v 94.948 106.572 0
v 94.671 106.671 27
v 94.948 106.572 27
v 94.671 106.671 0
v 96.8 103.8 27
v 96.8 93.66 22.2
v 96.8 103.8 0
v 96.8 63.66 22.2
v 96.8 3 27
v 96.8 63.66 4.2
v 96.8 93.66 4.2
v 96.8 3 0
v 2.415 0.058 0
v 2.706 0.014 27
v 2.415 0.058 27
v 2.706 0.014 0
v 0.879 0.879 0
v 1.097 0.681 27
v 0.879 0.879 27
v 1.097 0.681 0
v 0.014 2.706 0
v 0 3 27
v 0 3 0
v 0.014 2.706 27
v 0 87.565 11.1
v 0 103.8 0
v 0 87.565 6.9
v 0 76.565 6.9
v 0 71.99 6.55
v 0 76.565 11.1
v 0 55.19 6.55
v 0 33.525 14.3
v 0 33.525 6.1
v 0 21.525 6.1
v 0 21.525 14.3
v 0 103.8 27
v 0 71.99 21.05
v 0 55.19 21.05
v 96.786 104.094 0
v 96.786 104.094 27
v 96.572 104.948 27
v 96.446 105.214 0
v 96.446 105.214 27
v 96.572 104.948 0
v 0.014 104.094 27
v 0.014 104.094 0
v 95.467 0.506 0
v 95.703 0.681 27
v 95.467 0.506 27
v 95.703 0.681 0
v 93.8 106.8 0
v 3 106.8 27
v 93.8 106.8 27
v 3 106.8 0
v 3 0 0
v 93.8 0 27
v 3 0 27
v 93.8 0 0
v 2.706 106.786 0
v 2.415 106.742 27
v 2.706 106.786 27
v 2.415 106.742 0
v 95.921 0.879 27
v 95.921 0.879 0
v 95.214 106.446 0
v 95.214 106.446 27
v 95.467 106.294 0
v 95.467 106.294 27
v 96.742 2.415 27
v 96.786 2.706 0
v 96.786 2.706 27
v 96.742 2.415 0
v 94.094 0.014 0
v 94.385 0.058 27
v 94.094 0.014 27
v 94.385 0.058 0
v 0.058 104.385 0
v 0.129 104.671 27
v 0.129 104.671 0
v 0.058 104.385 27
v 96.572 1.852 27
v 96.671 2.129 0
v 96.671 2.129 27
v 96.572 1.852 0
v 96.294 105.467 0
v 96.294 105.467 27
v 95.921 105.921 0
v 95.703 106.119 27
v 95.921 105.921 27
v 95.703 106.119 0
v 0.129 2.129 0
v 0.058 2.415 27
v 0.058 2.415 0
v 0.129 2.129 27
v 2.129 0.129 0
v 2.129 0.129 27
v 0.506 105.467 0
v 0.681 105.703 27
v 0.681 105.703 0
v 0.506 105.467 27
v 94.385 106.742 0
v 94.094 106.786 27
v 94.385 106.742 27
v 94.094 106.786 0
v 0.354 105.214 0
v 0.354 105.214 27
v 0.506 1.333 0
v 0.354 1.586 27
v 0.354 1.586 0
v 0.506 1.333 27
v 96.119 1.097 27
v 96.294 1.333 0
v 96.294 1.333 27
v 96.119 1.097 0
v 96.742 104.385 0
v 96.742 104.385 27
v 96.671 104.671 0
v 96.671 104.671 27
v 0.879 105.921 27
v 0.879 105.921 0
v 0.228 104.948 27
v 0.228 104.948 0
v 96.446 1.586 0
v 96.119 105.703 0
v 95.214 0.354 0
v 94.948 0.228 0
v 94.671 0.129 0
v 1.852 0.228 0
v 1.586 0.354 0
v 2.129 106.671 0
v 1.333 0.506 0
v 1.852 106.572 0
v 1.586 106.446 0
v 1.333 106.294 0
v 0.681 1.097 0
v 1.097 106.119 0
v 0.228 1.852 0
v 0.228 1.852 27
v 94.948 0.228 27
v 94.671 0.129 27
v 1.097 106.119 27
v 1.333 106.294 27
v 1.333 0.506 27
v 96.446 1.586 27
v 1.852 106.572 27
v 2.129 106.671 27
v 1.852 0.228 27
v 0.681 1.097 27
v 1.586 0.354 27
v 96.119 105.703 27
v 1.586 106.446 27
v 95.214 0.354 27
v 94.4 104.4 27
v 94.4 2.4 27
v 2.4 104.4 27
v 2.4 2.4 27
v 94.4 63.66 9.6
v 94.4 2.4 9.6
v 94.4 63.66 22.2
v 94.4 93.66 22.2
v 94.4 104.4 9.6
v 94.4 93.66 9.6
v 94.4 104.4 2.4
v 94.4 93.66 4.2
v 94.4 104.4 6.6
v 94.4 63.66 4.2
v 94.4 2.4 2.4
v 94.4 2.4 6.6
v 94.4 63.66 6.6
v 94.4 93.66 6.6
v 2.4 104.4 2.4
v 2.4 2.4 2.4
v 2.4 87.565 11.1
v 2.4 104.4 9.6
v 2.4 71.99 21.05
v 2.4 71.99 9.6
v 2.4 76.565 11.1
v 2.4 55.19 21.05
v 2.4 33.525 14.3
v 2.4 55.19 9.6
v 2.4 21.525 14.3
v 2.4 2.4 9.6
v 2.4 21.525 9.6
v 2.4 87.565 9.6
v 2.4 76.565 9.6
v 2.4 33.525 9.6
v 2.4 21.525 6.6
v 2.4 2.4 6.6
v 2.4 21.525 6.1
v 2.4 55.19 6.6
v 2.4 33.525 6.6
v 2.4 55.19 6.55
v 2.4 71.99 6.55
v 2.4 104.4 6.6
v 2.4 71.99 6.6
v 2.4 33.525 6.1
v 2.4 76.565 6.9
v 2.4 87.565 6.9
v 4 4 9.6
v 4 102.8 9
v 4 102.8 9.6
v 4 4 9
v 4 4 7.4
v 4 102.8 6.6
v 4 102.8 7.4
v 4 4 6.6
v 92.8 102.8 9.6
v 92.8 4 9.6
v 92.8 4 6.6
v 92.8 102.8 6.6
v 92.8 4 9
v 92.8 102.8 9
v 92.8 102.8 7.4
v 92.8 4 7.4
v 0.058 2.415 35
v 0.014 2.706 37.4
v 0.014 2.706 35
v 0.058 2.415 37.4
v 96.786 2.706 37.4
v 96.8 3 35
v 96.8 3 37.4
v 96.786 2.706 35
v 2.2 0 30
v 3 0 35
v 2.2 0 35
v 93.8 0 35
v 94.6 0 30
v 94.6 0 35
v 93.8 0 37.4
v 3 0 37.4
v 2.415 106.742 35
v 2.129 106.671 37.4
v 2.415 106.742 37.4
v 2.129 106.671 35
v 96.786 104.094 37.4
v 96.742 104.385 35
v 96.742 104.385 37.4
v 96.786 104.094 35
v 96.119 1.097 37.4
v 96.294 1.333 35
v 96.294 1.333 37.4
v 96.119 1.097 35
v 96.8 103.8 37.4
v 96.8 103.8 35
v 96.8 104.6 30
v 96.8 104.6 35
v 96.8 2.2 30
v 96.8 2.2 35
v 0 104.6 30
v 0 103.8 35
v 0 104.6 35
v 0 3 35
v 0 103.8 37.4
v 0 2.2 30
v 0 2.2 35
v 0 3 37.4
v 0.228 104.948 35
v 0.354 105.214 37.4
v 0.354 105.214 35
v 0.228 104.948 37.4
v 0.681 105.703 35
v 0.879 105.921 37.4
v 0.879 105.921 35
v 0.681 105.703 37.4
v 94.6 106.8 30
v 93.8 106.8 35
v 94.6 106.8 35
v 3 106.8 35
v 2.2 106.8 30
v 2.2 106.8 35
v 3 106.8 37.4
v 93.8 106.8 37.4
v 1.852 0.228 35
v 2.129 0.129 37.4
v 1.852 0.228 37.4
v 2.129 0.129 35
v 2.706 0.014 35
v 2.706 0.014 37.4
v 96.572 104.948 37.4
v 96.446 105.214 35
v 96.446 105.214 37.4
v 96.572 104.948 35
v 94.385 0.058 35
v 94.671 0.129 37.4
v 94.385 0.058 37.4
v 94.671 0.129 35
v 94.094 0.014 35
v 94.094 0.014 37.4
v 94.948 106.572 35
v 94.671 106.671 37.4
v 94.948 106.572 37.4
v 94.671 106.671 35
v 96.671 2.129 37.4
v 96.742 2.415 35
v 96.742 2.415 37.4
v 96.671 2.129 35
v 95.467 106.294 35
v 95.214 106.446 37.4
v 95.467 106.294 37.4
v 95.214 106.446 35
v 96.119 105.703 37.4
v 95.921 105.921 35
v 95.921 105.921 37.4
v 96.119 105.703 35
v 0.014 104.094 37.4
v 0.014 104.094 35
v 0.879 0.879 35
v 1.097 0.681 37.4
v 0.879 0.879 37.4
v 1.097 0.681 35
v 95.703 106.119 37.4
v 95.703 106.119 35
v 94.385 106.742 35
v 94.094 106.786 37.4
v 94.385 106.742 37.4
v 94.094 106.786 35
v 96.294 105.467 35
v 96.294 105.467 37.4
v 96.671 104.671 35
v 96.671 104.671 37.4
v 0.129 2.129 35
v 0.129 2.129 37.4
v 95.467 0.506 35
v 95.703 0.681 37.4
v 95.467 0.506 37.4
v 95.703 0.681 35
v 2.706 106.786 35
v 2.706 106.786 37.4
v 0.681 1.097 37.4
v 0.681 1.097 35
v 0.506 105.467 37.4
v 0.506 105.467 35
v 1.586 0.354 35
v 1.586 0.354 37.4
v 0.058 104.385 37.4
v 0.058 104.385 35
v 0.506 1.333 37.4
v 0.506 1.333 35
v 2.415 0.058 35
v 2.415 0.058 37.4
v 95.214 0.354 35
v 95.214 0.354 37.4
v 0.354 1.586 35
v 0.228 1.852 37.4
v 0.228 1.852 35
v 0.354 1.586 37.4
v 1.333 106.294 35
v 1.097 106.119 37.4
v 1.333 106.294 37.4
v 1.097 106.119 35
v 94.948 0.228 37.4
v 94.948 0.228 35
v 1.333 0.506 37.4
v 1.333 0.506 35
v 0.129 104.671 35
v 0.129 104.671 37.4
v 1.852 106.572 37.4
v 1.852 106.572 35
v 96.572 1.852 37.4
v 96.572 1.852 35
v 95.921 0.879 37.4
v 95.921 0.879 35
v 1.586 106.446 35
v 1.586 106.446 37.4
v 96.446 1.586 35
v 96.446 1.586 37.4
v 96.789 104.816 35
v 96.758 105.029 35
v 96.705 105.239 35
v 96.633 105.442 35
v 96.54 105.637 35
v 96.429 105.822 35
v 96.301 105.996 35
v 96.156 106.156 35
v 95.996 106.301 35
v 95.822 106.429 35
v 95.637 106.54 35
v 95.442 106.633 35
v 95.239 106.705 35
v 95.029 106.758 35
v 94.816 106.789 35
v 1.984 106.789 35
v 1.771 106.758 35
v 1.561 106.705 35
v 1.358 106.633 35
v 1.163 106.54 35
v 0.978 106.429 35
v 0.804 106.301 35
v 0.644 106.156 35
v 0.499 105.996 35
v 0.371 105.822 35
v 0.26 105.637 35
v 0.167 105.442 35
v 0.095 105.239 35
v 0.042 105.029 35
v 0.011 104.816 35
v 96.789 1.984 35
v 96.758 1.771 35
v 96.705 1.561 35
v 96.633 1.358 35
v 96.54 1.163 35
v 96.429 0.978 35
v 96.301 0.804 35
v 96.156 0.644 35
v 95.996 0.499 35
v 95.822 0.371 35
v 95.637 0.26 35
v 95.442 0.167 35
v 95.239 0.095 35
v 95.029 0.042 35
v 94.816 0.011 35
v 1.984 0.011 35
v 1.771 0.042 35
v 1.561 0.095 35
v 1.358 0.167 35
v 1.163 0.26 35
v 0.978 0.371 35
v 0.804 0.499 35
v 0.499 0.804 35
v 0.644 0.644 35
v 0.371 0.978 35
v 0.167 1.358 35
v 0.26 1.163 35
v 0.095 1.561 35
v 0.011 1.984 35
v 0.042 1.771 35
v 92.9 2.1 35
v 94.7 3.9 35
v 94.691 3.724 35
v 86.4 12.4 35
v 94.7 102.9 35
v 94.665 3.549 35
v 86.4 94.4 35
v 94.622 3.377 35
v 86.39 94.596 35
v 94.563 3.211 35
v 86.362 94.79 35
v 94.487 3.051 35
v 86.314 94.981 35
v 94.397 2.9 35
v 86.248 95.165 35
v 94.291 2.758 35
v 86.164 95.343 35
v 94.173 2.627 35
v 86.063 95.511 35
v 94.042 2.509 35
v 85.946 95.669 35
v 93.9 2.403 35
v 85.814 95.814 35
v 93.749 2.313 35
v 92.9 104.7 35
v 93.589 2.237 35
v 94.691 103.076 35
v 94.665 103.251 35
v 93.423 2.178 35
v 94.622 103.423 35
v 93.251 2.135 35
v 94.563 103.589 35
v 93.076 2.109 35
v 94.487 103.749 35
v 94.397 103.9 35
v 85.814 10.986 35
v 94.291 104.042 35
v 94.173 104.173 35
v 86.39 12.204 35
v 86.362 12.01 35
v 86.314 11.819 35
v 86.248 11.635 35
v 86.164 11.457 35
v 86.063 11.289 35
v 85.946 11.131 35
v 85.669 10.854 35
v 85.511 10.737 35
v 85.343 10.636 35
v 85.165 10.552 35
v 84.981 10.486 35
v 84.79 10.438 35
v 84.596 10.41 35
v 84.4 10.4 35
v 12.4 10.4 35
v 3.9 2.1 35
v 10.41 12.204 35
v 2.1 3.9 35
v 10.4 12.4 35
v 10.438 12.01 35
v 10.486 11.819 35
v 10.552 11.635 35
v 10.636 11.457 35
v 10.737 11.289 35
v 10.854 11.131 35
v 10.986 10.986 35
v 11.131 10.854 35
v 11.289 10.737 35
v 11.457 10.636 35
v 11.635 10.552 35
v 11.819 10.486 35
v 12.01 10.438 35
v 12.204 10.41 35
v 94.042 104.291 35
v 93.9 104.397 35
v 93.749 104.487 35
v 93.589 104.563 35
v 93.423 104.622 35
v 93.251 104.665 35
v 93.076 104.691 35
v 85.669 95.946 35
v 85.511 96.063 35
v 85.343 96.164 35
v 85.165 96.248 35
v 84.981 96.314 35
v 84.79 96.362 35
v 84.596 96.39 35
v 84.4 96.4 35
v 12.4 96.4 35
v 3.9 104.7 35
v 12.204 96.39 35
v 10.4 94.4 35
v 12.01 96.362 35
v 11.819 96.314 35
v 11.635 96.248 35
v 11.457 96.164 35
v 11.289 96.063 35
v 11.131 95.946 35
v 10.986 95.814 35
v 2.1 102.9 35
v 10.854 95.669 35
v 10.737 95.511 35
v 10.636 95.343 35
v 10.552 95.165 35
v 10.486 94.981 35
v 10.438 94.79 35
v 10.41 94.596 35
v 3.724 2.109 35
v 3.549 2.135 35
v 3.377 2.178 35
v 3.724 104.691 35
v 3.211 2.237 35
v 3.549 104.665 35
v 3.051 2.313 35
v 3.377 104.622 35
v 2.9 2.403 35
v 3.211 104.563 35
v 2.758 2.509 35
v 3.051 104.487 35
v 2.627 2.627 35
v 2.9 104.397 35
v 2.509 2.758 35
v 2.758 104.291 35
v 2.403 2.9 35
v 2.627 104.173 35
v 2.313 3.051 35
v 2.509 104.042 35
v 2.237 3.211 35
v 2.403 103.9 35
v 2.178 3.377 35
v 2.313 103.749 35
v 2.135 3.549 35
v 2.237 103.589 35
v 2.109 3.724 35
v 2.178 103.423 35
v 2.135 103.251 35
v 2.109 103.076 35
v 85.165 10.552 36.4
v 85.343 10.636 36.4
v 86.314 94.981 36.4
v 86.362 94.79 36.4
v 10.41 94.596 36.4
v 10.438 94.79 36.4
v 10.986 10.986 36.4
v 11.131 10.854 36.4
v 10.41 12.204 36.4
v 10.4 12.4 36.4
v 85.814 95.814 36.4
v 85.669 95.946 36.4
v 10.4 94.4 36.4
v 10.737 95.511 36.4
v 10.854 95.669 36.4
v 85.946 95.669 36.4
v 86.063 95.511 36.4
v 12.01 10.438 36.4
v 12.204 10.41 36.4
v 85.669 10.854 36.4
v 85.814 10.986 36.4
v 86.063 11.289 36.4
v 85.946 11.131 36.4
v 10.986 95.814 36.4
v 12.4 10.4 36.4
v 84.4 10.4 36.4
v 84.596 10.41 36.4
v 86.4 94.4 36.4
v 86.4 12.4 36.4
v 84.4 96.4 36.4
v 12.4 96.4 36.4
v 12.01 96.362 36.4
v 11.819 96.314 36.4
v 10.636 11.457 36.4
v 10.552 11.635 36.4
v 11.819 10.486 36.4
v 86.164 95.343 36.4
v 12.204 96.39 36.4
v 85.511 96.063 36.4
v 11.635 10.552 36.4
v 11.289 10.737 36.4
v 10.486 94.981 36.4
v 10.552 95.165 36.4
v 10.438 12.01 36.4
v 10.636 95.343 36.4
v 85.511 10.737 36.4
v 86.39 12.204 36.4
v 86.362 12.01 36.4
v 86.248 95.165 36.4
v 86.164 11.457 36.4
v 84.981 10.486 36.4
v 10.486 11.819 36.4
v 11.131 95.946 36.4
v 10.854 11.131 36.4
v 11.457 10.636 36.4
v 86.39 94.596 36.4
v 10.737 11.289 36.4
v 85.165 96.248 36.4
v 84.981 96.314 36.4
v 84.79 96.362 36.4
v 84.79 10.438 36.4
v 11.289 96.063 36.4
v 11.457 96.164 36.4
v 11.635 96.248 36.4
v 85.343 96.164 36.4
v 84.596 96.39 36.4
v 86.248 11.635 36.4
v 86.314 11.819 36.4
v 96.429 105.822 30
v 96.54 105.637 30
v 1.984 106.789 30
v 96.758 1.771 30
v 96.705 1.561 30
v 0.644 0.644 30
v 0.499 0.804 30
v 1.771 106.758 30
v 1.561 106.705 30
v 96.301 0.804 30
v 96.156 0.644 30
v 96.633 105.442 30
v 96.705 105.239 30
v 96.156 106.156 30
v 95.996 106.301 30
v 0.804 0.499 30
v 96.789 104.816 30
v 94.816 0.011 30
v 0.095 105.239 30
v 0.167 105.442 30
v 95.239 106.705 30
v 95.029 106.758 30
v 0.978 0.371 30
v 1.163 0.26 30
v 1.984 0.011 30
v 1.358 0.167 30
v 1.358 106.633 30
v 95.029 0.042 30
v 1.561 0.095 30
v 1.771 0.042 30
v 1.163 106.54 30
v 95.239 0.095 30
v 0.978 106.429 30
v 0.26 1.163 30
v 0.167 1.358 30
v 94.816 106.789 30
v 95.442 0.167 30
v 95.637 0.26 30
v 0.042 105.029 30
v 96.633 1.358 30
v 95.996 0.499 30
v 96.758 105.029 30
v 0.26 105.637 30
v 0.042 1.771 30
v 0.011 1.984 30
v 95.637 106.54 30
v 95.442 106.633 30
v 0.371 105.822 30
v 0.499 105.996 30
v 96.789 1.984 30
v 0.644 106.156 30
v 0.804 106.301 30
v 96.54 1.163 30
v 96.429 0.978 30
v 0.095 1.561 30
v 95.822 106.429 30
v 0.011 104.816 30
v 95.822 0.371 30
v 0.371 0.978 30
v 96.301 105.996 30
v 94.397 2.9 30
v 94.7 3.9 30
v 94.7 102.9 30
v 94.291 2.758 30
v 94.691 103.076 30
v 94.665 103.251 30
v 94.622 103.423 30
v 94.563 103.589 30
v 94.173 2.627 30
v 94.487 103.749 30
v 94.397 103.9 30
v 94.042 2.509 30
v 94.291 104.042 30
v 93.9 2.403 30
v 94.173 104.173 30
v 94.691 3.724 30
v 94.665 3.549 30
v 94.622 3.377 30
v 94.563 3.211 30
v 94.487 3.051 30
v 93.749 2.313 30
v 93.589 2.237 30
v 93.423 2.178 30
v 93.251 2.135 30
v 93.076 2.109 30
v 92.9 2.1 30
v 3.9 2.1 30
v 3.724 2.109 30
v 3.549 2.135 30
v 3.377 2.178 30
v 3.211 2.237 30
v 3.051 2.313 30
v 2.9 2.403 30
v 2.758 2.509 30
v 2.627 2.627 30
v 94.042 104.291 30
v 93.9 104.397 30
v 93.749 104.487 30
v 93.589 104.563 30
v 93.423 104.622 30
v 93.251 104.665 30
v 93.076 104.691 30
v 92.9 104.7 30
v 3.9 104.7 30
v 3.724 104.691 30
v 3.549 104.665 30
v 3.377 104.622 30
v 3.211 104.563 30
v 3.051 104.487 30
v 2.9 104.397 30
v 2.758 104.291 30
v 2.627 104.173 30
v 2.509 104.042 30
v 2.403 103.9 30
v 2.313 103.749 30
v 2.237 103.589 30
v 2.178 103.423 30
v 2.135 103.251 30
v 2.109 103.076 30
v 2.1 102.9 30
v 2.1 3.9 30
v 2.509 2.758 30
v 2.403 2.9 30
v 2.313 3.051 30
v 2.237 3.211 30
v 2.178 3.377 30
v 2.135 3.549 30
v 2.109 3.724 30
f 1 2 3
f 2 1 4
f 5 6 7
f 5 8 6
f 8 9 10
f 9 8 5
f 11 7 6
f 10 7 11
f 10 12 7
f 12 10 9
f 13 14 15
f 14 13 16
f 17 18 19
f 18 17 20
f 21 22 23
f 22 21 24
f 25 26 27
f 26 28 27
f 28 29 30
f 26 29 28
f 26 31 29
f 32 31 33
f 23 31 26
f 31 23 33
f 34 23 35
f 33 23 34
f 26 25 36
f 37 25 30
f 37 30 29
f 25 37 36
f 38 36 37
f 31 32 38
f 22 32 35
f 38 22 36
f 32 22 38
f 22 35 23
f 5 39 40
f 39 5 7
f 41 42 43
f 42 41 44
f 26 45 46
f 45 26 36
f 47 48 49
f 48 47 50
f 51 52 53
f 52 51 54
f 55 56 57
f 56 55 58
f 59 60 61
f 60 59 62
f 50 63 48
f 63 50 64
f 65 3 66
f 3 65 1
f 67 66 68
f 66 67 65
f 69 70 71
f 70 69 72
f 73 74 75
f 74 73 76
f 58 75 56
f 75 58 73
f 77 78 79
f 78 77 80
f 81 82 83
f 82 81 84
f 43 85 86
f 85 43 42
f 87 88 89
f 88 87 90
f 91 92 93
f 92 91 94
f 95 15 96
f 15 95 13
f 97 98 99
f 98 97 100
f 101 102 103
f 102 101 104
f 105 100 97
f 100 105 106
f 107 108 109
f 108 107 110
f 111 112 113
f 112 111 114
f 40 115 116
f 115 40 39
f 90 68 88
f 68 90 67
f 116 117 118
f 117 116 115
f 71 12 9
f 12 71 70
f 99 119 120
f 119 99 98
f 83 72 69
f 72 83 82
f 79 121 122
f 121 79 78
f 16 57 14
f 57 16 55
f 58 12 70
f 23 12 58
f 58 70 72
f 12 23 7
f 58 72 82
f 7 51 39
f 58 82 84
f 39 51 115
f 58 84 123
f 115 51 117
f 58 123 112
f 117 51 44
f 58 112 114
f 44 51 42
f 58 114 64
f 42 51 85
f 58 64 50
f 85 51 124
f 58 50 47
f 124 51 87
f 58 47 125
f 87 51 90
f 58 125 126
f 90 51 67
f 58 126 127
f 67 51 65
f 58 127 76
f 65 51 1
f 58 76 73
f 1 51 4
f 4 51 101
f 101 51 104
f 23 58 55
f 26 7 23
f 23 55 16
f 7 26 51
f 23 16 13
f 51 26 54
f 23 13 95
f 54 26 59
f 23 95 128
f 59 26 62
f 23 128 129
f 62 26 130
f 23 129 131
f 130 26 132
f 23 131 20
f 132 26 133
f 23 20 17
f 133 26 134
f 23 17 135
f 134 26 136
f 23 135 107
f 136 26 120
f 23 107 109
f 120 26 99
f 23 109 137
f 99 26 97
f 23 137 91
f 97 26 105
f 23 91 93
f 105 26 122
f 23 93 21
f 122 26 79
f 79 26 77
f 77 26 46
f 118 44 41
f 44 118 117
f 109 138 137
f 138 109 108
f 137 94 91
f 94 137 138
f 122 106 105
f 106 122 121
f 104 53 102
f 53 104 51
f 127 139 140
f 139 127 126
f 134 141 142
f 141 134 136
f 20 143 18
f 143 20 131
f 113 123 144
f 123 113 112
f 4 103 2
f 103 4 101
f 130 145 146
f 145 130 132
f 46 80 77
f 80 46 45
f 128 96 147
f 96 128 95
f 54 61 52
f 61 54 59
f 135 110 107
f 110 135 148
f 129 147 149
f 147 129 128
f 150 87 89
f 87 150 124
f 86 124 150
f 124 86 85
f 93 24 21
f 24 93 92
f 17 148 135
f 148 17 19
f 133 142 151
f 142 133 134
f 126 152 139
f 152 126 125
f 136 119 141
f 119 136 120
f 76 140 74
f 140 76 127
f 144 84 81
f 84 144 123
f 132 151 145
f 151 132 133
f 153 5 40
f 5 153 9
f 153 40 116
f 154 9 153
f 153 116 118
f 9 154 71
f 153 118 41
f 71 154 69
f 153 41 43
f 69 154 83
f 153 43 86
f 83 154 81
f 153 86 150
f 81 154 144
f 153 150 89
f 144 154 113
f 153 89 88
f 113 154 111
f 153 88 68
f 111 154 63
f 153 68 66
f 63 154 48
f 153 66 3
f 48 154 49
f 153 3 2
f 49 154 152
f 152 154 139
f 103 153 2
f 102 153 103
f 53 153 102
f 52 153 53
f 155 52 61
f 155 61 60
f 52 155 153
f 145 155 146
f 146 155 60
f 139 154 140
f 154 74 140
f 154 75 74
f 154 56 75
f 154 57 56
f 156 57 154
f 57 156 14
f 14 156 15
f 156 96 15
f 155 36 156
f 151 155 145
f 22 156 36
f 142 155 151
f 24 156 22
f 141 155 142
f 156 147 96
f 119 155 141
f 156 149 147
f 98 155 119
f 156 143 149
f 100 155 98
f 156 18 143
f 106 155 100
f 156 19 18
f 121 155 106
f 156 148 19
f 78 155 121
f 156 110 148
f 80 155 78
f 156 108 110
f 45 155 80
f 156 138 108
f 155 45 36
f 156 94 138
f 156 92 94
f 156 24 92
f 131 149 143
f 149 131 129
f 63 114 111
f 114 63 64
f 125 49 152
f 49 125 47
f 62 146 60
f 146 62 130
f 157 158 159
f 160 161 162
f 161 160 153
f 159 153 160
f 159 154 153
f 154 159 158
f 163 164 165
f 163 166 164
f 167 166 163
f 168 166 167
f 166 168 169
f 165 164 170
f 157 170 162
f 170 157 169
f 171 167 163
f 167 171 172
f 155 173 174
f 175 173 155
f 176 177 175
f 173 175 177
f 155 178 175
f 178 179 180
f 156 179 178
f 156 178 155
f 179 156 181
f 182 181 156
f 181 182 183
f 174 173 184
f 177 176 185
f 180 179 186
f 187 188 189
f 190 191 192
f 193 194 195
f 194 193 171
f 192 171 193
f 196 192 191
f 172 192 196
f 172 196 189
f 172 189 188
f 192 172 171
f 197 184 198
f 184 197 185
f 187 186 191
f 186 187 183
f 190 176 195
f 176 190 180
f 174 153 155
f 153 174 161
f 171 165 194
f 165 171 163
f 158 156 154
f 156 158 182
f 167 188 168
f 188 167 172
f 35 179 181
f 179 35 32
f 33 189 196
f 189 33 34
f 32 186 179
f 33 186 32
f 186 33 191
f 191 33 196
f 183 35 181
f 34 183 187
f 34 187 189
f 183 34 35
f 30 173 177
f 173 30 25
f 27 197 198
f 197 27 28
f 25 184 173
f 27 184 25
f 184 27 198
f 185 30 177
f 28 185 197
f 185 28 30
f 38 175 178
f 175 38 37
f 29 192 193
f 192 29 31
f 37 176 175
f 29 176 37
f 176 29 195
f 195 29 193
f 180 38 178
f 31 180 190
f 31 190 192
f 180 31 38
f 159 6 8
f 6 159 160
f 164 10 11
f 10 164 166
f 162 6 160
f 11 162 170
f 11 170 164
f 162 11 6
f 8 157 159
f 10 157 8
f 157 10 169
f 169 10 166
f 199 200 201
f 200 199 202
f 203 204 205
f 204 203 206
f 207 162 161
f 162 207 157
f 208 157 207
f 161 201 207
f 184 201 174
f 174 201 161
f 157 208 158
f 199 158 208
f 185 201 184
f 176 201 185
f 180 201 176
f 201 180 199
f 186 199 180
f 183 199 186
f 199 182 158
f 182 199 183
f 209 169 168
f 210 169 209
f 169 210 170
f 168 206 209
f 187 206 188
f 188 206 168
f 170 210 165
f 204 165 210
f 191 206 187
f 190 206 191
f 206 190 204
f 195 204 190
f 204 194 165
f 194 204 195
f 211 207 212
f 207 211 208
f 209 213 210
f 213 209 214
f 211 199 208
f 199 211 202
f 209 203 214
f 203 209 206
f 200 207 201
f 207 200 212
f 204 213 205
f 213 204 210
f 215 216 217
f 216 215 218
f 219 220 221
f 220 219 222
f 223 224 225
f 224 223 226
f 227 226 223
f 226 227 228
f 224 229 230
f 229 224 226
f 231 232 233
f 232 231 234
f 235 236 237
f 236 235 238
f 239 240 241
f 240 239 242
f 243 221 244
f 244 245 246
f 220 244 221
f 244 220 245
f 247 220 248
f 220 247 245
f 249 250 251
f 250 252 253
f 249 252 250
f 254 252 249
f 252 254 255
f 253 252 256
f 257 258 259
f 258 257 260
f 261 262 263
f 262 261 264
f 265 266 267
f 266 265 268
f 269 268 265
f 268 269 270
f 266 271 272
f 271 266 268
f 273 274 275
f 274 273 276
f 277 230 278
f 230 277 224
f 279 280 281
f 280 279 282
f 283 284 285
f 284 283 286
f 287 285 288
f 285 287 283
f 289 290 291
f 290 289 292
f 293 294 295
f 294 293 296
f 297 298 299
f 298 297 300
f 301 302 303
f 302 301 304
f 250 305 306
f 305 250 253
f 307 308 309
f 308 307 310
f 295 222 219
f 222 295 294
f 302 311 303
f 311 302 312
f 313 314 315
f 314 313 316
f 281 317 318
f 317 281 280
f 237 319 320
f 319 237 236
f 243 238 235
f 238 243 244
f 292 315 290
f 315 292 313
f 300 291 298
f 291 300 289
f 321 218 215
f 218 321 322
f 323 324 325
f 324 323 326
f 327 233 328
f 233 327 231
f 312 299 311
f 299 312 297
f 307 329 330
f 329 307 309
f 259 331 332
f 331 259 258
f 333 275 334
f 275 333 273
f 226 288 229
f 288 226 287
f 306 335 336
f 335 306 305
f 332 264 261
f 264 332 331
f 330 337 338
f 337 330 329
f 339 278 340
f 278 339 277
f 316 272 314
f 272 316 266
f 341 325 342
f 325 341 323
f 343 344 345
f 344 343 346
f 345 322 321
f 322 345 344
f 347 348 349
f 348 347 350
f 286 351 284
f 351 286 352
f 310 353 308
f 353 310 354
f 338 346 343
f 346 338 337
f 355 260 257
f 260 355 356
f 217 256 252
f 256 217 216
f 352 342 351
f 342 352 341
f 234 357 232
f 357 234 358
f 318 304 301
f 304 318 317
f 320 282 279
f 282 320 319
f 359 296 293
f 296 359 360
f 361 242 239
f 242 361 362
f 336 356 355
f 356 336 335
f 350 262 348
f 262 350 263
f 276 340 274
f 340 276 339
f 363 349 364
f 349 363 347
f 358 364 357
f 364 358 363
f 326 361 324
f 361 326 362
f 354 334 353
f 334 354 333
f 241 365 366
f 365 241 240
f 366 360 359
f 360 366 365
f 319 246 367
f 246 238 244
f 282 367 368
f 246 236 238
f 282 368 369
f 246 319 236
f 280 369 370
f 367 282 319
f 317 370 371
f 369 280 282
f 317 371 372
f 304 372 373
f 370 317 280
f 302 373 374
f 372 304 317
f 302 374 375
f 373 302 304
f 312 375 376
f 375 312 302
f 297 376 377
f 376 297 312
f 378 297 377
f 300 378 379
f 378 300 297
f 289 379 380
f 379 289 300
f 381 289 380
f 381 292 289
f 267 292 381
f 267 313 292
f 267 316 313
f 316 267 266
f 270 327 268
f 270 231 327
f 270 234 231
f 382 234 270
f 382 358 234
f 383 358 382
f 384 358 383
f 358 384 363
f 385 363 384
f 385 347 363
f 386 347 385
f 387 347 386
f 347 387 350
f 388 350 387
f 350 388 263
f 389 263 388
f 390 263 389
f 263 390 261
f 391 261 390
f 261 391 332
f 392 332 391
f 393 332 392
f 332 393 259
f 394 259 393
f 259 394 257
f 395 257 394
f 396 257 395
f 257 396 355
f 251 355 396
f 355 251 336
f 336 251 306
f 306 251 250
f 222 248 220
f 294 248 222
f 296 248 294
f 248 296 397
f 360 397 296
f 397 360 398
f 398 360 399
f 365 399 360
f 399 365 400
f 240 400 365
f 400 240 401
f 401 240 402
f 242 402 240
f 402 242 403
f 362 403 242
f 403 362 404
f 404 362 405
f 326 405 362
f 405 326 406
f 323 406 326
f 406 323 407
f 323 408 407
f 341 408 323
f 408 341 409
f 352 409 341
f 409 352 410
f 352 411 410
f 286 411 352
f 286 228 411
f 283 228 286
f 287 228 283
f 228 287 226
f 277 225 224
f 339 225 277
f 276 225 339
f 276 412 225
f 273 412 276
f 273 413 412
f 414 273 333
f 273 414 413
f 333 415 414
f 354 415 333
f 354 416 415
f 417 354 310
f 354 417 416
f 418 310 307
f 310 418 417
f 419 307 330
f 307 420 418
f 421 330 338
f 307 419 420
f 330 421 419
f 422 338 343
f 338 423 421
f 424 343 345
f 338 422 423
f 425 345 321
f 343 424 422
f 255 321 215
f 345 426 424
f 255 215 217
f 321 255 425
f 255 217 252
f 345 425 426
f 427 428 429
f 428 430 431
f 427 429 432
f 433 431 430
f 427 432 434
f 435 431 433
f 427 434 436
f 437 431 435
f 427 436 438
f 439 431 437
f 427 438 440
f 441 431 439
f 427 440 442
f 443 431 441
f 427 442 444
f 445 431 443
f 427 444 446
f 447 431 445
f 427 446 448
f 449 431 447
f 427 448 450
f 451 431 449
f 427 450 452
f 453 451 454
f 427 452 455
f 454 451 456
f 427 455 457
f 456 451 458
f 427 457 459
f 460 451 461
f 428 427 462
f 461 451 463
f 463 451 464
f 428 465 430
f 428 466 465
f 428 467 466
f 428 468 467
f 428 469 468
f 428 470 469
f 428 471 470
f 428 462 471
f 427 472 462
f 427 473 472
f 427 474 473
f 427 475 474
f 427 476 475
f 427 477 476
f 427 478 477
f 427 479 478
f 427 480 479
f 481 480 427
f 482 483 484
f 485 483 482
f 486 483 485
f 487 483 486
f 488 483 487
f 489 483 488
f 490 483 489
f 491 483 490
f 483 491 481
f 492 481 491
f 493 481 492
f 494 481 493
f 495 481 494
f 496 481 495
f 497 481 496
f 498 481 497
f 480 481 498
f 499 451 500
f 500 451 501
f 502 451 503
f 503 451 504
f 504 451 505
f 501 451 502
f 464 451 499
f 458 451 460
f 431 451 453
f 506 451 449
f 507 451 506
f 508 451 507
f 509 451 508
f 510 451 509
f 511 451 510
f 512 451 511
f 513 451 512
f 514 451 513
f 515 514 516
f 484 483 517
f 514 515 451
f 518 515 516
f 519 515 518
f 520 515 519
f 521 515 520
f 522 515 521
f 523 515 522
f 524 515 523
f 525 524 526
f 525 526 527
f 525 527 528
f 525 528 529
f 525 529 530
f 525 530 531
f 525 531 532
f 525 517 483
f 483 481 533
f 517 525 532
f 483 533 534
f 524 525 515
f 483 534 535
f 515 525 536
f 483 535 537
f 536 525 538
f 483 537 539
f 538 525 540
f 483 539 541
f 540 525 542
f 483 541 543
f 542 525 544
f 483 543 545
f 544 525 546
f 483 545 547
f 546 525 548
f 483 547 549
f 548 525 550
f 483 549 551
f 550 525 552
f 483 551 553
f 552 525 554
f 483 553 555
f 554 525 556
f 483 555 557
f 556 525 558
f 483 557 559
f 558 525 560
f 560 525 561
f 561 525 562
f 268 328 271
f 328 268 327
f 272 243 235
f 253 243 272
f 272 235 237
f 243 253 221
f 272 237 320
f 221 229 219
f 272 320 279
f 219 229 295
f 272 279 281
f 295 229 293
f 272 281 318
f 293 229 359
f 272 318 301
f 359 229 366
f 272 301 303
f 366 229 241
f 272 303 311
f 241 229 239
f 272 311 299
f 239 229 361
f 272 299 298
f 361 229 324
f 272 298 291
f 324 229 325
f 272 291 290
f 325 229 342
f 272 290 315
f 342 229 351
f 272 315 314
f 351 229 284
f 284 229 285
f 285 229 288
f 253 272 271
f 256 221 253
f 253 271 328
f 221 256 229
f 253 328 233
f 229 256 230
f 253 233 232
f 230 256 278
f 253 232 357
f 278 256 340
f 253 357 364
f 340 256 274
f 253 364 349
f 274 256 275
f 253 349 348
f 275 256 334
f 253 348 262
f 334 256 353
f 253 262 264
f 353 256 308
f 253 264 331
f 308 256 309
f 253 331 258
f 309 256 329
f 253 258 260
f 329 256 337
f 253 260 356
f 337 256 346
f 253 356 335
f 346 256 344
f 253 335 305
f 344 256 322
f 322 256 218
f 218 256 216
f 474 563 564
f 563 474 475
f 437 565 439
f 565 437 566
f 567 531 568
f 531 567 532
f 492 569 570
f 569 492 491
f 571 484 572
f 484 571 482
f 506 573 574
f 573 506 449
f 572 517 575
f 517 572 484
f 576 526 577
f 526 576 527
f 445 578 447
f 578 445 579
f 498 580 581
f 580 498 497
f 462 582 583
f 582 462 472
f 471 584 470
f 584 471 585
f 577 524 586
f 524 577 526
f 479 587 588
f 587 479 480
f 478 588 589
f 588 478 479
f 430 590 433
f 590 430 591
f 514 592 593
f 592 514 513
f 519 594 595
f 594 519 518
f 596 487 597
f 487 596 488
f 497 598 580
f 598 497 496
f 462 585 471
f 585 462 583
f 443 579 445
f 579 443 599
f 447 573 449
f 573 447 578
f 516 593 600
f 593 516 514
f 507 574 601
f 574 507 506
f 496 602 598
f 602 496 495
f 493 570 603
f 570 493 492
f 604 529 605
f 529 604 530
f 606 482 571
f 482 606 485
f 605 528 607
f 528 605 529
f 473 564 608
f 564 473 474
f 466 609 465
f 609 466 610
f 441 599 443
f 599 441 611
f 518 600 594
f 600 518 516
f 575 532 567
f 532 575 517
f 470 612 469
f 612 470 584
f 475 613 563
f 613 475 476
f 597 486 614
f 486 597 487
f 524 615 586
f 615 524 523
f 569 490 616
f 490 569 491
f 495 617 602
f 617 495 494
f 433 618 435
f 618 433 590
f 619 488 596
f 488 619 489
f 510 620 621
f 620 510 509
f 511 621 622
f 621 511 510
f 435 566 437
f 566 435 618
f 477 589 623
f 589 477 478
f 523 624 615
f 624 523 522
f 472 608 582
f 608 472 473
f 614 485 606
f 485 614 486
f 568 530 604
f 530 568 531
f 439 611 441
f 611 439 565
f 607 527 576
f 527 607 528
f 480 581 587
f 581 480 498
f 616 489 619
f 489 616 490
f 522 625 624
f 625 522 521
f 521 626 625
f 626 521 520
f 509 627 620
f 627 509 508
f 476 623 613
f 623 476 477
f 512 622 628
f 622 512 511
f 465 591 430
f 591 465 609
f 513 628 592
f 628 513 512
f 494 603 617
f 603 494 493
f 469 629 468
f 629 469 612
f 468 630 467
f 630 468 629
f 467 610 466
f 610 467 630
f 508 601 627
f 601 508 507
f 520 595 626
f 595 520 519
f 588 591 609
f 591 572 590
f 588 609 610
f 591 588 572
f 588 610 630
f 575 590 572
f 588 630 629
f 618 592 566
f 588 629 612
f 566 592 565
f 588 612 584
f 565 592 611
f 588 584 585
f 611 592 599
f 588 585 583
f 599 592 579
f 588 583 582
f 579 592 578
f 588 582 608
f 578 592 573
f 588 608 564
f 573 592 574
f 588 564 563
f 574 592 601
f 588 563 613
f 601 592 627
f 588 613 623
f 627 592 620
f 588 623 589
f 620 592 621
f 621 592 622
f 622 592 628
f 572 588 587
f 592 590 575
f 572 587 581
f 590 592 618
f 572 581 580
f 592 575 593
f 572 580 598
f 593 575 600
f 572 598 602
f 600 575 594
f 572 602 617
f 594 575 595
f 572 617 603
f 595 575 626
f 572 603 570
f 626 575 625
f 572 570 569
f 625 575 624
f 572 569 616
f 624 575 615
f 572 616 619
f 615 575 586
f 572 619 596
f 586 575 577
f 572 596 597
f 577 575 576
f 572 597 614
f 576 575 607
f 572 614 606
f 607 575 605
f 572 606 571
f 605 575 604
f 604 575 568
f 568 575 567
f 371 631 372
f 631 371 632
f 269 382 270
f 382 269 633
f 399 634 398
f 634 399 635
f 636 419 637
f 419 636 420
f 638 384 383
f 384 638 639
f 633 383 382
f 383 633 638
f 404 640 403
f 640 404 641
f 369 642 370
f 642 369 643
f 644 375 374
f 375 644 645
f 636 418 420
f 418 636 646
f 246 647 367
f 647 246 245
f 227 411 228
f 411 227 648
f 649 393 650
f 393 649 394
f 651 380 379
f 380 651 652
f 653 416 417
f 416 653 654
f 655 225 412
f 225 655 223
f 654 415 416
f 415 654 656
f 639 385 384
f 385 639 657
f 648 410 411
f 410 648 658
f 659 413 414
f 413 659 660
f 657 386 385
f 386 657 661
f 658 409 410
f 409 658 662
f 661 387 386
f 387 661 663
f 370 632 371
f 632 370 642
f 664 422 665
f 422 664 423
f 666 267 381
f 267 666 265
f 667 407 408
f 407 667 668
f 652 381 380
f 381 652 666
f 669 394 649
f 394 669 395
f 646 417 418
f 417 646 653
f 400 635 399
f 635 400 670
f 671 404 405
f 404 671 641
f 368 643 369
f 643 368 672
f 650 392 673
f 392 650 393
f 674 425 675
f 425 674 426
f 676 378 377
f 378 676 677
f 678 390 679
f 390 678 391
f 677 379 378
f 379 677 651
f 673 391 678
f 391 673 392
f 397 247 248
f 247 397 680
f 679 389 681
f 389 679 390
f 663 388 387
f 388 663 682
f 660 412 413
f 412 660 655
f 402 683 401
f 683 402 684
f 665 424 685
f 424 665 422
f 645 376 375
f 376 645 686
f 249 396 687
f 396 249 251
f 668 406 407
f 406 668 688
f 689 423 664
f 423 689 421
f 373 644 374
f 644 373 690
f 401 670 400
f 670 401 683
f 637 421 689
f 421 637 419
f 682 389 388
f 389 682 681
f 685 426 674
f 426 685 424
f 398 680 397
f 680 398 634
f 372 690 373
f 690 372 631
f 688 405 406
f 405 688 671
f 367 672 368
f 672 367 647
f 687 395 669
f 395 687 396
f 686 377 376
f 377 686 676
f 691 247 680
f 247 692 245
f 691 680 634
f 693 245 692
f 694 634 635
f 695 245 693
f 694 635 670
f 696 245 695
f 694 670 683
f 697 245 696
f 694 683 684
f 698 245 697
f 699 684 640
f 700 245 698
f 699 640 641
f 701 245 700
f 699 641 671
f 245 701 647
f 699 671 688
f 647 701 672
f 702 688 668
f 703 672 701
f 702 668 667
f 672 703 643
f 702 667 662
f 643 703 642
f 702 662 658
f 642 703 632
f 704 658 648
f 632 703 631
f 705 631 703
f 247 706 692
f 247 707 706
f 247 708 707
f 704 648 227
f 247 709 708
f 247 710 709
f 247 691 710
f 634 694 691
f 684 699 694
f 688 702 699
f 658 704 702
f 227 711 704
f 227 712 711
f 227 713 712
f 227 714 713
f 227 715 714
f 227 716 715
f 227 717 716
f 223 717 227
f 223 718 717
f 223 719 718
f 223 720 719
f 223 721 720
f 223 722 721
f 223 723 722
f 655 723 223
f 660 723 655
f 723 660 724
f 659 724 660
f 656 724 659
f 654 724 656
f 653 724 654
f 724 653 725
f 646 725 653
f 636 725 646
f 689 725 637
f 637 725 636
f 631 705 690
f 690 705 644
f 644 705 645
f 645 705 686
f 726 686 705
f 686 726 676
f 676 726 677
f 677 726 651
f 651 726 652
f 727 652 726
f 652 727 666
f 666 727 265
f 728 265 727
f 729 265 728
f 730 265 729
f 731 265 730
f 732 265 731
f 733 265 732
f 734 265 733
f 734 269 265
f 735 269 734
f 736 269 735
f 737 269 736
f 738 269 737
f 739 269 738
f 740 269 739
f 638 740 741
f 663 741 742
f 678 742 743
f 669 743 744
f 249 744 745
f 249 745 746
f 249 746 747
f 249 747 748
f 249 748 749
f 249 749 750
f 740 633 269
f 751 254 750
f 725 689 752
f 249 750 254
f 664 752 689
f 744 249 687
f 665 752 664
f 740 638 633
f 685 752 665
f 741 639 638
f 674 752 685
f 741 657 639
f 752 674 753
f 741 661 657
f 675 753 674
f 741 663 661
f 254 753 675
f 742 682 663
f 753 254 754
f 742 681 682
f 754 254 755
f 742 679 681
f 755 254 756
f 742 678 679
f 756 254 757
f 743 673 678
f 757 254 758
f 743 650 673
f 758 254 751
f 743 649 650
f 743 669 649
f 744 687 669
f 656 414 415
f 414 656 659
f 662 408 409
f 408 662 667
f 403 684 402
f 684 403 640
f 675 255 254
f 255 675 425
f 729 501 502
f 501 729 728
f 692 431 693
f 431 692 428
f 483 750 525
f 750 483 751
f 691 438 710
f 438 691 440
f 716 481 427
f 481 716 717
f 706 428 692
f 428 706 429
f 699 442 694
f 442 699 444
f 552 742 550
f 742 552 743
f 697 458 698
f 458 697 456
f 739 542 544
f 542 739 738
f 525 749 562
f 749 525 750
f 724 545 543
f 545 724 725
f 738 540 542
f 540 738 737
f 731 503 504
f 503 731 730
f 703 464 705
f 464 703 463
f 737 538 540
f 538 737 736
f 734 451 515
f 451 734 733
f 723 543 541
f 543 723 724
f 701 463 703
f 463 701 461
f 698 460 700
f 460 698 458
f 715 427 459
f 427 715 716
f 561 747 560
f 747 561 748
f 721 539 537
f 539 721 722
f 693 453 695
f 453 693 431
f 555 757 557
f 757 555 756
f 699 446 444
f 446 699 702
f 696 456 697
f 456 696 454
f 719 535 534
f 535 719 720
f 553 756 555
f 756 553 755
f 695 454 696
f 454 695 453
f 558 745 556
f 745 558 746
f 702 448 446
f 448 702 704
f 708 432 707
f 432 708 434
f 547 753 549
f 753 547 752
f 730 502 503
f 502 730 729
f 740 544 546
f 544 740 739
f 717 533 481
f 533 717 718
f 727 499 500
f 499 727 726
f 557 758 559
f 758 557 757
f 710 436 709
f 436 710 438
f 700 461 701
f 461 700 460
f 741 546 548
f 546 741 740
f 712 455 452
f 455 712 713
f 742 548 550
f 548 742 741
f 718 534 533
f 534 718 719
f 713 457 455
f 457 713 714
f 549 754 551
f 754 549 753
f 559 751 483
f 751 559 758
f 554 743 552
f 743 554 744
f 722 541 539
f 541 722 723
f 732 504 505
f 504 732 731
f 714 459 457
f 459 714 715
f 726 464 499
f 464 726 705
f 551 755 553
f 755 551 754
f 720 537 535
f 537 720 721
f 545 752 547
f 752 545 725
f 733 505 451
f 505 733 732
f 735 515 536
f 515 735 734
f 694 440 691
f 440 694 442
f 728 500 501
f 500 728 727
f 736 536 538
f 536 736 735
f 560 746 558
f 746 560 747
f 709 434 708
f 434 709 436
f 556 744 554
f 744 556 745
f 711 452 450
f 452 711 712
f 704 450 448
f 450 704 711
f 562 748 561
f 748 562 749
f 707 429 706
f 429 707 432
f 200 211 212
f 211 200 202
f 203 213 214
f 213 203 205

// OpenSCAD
// DiSEqC controller printable enclosure (base + lid)
// Units: mm

$fn = 64;

// -----------------------------------------------------------------------------
// Board and case envelope
// -----------------------------------------------------------------------------
pcb_w = 90.0;   // X (left-right)
pcb_l = 100.0;  // Y (front-back)
pcb_t = 1.6;

xy_clearance = 1.0;   // free space around PCB edges
wall = 2.4;
floor_t = 2.4;
top_clearance = 18.0; // free height above PCB top

// PCB support ledges (no mounting-hole assumptions)
ledge_depth = 1.6;
ledge_drop = 0.8;     // ledge is slightly below PCB bottom
standoff_h = 5.0;     // PCB bottom Z above base floor

// Lid behavior
lid_t = 2.4;
lid_lip_h = 5.0;
lid_gap = 0.3;        // fit clearance between lid lip and base

// Output mode: "base", "lid", or "preview"
mode = "preview";

// -----------------------------------------------------------------------------
// Derived dimensions
// -----------------------------------------------------------------------------
inner_w = pcb_w + 2 * xy_clearance;
inner_l = pcb_l + 2 * xy_clearance;
inner_h = standoff_h + pcb_t + top_clearance;

outer_w = inner_w + 2 * wall;
outer_l = inner_l + 2 * wall;
base_h = floor_t + inner_h;

// Useful references in case coordinates
board_x0 = wall + xy_clearance;
board_y0 = wall + xy_clearance;
pcb_bottom_z = floor_t + standoff_h;

// -----------------------------------------------------------------------------
// Connector cutouts
// Coordinates are PCB-space values translated from the KiCad board:
// board outline 50..140 (X), 50..150 (Y), so y_from_board_bottom = y - 50.
// Tune these after a quick fit print.
// -----------------------------------------------------------------------------

// J1 Barrel Jack (left wall)
J1_enable = true;
J1_y = 25.125;
J1_z = pcb_bottom_z + 2.8;
J1_h = 8.2;
J1_w = 12.0;

// J4 USB-C (left wall)
J4_enable = true;
J4_y = 79.665;
J4_z = pcb_bottom_z + 1.6;
J4_h = 4.2;
J4_w = 11.0;

// J8 RJ45 (left wall)
J8_enable = true;
J8_y = 61.19;
J8_z = pcb_bottom_z + 6.4;
J8_h = 14.5;
J8_w = 16.8;

// J6/J7 SMA pair (right wall) as one slot for tolerance
J67_enable = true;
J67_y = 76.26;
J67_z = pcb_bottom_z + 5.8;
J67_h = 18.0;
J67_w = 30.0;

// -----------------------------------------------------------------------------
// Geometry helpers
// -----------------------------------------------------------------------------
module rounded_box(size_xyz, r) {
    x = size_xyz[0];
    y = size_xyz[1];
    z = size_xyz[2];
    hull() {
        for (sx = [r, x - r]) {
            for (sy = [r, y - r]) {
                translate([sx, sy, 0]) cylinder(h = z, r = r);
            }
        }
    }
}

module left_cutout(y_center, z_center, w_y, h_z) {
    translate([-0.1, wall + y_center - w_y / 2, z_center - h_z / 2])
        cube([wall + 0.2, w_y, h_z]);
}

module right_cutout(y_center, z_center, w_y, h_z) {
    translate([outer_w - wall - 0.1, wall + y_center - w_y / 2, z_center - h_z / 2])
        cube([wall + 0.2, w_y, h_z]);
}

module pcb_ledges() {
    z0 = pcb_bottom_z - ledge_drop;

    // Long ledges, split around side cutout zones.
    translate([wall, wall, z0]) cube([ledge_depth, inner_l, ledge_drop + pcb_t + 0.6]);
    translate([outer_w - wall - ledge_depth, wall, z0]) cube([ledge_depth, inner_l, ledge_drop + pcb_t + 0.6]);

    // End stops to keep board from sliding in Y.
    translate([wall + ledge_depth, wall, z0]) cube([inner_w - 2 * ledge_depth, ledge_depth, ledge_drop + pcb_t + 0.6]);
    translate([wall + ledge_depth, outer_l - wall - ledge_depth, z0]) cube([inner_w - 2 * ledge_depth, ledge_depth, ledge_drop + pcb_t + 0.6]);
}

module base_shell() {
    difference() {
        rounded_box([outer_w, outer_l, base_h], 3.0);
        translate([wall, wall, floor_t]) cube([inner_w, inner_l, inner_h + 0.2]);

        if (J1_enable) left_cutout(J1_y, J1_z, J1_w, J1_h);
        if (J4_enable) left_cutout(J4_y, J4_z, J4_w, J4_h);
        if (J8_enable) left_cutout(J8_y, J8_z, J8_w, J8_h);
        if (J67_enable) right_cutout(J67_y, J67_z, J67_w, J67_h);
    }

    pcb_ledges();
}

module lid_shell() {
    // Plate
    difference() {
        rounded_box([outer_w, outer_l, lid_t], 3.0);

        // Optional lightweighting pocket.
        translate([wall + 8, wall + 8, -0.1])
            rounded_box([inner_w - 16, inner_l - 16, lid_t - 0.9], 2.0);
    }

    // Locating lip
    translate([0, 0, -lid_lip_h])
    difference() {
        rounded_box([outer_w, outer_l, lid_lip_h], 2.2);
        translate([wall - lid_gap, wall - lid_gap, -0.1])
            rounded_box([inner_w + 2 * lid_gap, inner_l + 2 * lid_gap, lid_lip_h + 0.2], 1.8);
    }
}

module assembly_preview() {
    color([0.86, 0.86, 0.9]) base_shell();

    // Simple PCB proxy for visual checks.
    color([0.0, 0.4, 0.1, 0.5])
        translate([board_x0, board_y0, pcb_bottom_z])
            cube([pcb_w, pcb_l, pcb_t]);

    color([0.8, 0.82, 0.84, 0.6])
        translate([0, 0, base_h + 8])
            lid_shell();
}

if (mode == "base") {
    base_shell();
} else if (mode == "lid") {
    lid_shell();
} else {
    assembly_preview();
}
